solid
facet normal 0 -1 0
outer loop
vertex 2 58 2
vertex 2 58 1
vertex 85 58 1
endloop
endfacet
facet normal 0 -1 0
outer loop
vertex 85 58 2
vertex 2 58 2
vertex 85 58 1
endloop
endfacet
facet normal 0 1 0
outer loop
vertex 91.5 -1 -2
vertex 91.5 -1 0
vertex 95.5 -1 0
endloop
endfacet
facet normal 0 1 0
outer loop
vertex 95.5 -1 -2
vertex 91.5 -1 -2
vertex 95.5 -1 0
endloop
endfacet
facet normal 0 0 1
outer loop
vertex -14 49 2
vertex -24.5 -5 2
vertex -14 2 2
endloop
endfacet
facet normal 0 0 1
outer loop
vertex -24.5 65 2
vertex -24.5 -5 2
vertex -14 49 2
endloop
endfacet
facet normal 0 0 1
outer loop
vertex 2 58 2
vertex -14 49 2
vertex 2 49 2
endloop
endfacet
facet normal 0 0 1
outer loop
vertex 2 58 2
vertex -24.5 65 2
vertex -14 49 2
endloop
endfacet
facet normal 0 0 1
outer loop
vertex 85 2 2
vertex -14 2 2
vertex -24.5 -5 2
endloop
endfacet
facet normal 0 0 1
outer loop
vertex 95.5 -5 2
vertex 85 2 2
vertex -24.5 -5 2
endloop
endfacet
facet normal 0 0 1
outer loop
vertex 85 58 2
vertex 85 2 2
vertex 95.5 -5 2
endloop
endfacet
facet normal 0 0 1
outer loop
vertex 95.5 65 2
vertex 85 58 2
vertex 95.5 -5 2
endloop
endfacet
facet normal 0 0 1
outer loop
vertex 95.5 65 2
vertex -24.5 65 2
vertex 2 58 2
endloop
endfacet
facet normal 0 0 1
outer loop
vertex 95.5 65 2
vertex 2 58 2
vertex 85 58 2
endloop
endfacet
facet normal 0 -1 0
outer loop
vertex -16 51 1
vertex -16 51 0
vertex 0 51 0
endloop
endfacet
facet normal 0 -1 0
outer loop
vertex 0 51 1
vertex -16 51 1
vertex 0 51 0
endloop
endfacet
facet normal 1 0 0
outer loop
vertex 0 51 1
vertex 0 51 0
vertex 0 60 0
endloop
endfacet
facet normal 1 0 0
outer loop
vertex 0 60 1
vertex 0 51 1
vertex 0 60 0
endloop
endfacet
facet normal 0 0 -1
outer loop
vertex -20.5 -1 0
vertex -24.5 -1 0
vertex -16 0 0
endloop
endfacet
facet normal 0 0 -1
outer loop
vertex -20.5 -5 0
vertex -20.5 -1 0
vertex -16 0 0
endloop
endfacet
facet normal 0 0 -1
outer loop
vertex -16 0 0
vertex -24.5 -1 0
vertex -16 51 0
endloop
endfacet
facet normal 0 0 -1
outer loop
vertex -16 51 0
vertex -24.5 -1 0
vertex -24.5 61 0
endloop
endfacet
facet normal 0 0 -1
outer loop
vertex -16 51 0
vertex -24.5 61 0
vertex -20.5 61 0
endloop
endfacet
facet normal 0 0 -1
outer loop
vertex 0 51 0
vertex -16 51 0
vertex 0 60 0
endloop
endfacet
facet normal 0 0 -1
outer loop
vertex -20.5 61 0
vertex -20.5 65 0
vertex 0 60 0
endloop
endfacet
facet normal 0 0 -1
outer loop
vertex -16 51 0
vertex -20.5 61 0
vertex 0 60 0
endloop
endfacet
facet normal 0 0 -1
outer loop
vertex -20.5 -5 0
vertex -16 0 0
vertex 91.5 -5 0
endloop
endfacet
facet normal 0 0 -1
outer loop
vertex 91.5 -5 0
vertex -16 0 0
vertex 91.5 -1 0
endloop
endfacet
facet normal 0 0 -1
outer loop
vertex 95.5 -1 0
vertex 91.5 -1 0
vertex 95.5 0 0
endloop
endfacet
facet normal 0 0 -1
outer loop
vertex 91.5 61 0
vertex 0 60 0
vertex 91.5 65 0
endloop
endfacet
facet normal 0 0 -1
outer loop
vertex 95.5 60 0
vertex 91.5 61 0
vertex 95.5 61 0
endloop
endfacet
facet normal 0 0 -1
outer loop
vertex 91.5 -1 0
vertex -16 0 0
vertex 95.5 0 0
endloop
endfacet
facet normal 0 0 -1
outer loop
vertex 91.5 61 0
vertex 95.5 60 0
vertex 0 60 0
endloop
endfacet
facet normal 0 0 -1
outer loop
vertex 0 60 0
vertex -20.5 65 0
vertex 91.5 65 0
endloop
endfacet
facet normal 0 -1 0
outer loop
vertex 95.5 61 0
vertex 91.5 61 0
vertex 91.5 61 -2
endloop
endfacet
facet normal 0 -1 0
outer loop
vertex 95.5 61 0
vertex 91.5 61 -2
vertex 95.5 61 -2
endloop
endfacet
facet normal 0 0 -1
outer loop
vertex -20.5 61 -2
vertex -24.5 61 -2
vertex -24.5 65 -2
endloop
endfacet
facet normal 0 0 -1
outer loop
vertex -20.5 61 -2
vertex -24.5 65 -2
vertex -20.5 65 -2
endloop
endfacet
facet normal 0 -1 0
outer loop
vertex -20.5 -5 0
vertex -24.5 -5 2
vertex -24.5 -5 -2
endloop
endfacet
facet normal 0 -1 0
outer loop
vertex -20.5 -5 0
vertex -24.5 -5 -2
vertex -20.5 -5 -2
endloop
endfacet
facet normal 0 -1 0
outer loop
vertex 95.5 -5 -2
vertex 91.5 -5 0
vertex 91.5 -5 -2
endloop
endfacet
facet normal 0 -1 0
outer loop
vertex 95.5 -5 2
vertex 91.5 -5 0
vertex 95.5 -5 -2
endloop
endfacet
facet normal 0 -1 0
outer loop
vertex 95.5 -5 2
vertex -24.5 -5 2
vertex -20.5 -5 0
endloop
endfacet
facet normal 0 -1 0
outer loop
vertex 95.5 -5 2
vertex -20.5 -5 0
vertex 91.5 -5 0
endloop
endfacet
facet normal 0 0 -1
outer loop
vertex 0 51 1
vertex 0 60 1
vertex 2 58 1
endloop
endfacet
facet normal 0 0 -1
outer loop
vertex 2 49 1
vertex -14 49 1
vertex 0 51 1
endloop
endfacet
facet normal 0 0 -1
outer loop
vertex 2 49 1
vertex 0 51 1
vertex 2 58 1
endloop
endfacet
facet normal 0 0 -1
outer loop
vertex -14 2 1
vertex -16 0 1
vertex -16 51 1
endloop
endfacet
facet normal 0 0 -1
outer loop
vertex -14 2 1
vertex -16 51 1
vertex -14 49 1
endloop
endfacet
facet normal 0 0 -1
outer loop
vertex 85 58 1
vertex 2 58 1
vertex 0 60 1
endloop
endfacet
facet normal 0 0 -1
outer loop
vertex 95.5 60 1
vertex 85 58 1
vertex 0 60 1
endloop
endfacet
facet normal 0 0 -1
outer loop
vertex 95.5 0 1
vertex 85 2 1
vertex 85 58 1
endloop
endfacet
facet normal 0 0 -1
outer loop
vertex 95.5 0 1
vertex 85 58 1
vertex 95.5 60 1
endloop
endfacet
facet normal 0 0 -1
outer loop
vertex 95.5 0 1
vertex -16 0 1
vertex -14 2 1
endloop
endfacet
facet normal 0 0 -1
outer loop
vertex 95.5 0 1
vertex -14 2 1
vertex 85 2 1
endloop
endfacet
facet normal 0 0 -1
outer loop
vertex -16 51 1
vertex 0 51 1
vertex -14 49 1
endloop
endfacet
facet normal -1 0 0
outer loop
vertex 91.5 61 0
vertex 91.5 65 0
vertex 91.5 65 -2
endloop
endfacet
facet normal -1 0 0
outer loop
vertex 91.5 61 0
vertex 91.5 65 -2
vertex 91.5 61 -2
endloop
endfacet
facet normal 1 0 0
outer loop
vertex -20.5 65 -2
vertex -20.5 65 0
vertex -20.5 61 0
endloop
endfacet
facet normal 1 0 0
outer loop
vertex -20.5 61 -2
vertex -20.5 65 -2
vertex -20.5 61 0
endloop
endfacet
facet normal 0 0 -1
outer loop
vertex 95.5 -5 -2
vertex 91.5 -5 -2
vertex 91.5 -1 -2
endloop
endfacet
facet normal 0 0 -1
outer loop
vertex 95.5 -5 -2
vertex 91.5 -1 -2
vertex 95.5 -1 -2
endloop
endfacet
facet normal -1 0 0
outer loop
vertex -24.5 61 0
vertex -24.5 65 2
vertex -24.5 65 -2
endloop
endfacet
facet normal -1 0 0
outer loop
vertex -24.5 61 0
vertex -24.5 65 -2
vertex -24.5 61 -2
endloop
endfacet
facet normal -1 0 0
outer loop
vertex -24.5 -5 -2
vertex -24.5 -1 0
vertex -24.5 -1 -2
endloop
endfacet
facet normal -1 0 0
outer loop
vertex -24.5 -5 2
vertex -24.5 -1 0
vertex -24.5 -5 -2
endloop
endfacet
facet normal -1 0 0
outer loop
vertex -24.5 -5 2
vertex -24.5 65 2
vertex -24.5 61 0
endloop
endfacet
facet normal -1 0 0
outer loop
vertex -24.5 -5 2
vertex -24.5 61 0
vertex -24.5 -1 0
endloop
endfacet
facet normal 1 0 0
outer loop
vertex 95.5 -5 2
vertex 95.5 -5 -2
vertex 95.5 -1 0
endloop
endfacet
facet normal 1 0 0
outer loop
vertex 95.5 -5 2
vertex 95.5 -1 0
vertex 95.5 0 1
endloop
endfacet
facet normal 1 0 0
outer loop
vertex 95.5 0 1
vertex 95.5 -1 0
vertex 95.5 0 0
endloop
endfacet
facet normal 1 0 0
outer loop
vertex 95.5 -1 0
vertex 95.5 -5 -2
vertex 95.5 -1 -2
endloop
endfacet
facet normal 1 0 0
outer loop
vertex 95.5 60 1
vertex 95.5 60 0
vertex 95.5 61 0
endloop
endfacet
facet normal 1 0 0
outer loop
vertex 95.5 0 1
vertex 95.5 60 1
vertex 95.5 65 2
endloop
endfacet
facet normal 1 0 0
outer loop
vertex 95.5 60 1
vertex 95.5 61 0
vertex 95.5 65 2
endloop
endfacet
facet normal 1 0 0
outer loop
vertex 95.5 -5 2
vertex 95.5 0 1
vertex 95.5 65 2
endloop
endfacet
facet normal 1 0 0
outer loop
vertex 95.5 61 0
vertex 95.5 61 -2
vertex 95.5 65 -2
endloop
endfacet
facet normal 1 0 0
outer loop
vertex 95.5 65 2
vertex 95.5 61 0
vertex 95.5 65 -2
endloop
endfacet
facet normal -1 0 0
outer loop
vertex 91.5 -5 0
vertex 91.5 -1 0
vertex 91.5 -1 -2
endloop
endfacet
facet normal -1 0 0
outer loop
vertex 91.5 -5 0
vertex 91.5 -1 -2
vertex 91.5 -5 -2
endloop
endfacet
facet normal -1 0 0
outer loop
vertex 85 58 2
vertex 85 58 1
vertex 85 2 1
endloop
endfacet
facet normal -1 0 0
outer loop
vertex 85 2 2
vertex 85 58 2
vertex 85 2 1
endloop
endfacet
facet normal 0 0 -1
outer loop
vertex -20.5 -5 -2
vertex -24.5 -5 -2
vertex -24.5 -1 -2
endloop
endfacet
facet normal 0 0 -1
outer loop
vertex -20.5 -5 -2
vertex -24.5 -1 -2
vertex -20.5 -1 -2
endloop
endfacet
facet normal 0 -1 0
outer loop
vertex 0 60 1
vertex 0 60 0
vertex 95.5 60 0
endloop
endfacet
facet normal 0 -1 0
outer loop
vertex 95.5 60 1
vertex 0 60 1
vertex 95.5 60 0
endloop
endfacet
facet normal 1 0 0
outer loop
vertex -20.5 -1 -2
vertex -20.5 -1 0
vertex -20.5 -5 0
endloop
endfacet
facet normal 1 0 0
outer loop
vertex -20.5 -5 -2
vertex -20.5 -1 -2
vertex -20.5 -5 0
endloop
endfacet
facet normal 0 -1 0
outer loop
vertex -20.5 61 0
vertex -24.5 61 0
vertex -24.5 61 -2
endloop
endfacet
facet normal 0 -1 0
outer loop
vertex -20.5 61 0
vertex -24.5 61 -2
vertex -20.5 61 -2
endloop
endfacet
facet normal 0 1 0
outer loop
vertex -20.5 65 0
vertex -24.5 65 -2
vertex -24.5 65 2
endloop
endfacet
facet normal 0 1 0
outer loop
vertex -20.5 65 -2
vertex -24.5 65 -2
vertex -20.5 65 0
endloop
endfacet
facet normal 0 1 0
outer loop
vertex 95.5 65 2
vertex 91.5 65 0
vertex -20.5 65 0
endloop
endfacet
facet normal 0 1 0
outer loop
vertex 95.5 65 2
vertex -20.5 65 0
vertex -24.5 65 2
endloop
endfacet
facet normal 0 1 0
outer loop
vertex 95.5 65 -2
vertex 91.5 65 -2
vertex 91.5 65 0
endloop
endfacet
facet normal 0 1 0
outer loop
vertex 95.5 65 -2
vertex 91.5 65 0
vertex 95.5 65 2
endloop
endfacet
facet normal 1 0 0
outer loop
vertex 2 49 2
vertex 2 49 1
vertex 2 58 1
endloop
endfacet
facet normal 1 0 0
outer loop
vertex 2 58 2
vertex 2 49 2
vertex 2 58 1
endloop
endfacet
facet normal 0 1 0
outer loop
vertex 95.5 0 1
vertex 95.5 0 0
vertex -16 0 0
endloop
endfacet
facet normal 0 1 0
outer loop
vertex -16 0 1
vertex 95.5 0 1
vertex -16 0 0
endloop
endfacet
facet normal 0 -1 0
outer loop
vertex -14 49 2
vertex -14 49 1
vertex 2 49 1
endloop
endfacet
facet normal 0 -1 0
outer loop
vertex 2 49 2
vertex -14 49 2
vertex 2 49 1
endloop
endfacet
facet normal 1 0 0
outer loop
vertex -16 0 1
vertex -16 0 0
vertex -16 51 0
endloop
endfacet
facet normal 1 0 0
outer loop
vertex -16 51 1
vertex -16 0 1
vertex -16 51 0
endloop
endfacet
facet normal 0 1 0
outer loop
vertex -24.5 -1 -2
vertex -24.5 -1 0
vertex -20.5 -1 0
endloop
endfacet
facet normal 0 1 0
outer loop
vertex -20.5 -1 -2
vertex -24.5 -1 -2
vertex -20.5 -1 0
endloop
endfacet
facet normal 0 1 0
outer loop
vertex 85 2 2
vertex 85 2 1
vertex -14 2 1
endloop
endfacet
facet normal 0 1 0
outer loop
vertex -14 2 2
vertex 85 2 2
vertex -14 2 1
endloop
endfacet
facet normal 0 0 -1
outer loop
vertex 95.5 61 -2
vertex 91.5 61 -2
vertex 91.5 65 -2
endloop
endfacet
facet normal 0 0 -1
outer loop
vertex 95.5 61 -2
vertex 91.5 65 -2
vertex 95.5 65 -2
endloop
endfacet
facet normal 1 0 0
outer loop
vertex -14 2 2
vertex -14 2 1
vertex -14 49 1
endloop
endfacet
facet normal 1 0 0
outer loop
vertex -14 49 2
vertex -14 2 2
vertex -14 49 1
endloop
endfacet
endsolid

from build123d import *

# Parameters (mm, degrees)
F0_W     = 120
F0_H     = 70
F1_DEPTH = 2
F3_DEPTH = 1
F4_W     = 4
F4_H     = 4
F5_DEPTH = 2


with BuildPart() as f1:
    # F0 (on Top) → F1 (new body)
    with BuildSketch(Plane.XY):
        with Locations((35.5, 30)):
            Rectangle(F0_W, F0_H)
        Polygon((2, 49), (2, 58), (85, 58), (85, 2), (-14, 2), (-14, 49), align=None, mode=Mode.SUBTRACT)
    extrude(amount=F1_DEPTH)

    # F2 (on face) → F3 (cut)
    with BuildSketch(Plane(origin=(0, 0, 0), x_dir=(1, 0, 0), z_dir=(0, 0, -1))):
        Polygon((95.5, 0), (-16, 0), (-16, -51), (0, -51), (0, -60), (95.5, -60), align=None)
    extrude(amount=-F3_DEPTH, mode=Mode.SUBTRACT)

    # F4 (on face) → F5 (join)
    with BuildSketch(Plane(origin=(0, 0, 0), x_dir=(1, 0, 0), z_dir=(0, 0, -1))):
        with Locations((-22.5, 3)):
            Rectangle(F4_W, F4_H)
        with Locations((-22.5, -63)):
            Rectangle(F4_W, F4_H)
        with Locations((93.5, 3)):
            Rectangle(F4_W, F4_H)
        with Locations((93.5, -63)):
            Rectangle(F4_W, F4_H)
    extrude(amount=F5_DEPTH)


solid = f1.part
